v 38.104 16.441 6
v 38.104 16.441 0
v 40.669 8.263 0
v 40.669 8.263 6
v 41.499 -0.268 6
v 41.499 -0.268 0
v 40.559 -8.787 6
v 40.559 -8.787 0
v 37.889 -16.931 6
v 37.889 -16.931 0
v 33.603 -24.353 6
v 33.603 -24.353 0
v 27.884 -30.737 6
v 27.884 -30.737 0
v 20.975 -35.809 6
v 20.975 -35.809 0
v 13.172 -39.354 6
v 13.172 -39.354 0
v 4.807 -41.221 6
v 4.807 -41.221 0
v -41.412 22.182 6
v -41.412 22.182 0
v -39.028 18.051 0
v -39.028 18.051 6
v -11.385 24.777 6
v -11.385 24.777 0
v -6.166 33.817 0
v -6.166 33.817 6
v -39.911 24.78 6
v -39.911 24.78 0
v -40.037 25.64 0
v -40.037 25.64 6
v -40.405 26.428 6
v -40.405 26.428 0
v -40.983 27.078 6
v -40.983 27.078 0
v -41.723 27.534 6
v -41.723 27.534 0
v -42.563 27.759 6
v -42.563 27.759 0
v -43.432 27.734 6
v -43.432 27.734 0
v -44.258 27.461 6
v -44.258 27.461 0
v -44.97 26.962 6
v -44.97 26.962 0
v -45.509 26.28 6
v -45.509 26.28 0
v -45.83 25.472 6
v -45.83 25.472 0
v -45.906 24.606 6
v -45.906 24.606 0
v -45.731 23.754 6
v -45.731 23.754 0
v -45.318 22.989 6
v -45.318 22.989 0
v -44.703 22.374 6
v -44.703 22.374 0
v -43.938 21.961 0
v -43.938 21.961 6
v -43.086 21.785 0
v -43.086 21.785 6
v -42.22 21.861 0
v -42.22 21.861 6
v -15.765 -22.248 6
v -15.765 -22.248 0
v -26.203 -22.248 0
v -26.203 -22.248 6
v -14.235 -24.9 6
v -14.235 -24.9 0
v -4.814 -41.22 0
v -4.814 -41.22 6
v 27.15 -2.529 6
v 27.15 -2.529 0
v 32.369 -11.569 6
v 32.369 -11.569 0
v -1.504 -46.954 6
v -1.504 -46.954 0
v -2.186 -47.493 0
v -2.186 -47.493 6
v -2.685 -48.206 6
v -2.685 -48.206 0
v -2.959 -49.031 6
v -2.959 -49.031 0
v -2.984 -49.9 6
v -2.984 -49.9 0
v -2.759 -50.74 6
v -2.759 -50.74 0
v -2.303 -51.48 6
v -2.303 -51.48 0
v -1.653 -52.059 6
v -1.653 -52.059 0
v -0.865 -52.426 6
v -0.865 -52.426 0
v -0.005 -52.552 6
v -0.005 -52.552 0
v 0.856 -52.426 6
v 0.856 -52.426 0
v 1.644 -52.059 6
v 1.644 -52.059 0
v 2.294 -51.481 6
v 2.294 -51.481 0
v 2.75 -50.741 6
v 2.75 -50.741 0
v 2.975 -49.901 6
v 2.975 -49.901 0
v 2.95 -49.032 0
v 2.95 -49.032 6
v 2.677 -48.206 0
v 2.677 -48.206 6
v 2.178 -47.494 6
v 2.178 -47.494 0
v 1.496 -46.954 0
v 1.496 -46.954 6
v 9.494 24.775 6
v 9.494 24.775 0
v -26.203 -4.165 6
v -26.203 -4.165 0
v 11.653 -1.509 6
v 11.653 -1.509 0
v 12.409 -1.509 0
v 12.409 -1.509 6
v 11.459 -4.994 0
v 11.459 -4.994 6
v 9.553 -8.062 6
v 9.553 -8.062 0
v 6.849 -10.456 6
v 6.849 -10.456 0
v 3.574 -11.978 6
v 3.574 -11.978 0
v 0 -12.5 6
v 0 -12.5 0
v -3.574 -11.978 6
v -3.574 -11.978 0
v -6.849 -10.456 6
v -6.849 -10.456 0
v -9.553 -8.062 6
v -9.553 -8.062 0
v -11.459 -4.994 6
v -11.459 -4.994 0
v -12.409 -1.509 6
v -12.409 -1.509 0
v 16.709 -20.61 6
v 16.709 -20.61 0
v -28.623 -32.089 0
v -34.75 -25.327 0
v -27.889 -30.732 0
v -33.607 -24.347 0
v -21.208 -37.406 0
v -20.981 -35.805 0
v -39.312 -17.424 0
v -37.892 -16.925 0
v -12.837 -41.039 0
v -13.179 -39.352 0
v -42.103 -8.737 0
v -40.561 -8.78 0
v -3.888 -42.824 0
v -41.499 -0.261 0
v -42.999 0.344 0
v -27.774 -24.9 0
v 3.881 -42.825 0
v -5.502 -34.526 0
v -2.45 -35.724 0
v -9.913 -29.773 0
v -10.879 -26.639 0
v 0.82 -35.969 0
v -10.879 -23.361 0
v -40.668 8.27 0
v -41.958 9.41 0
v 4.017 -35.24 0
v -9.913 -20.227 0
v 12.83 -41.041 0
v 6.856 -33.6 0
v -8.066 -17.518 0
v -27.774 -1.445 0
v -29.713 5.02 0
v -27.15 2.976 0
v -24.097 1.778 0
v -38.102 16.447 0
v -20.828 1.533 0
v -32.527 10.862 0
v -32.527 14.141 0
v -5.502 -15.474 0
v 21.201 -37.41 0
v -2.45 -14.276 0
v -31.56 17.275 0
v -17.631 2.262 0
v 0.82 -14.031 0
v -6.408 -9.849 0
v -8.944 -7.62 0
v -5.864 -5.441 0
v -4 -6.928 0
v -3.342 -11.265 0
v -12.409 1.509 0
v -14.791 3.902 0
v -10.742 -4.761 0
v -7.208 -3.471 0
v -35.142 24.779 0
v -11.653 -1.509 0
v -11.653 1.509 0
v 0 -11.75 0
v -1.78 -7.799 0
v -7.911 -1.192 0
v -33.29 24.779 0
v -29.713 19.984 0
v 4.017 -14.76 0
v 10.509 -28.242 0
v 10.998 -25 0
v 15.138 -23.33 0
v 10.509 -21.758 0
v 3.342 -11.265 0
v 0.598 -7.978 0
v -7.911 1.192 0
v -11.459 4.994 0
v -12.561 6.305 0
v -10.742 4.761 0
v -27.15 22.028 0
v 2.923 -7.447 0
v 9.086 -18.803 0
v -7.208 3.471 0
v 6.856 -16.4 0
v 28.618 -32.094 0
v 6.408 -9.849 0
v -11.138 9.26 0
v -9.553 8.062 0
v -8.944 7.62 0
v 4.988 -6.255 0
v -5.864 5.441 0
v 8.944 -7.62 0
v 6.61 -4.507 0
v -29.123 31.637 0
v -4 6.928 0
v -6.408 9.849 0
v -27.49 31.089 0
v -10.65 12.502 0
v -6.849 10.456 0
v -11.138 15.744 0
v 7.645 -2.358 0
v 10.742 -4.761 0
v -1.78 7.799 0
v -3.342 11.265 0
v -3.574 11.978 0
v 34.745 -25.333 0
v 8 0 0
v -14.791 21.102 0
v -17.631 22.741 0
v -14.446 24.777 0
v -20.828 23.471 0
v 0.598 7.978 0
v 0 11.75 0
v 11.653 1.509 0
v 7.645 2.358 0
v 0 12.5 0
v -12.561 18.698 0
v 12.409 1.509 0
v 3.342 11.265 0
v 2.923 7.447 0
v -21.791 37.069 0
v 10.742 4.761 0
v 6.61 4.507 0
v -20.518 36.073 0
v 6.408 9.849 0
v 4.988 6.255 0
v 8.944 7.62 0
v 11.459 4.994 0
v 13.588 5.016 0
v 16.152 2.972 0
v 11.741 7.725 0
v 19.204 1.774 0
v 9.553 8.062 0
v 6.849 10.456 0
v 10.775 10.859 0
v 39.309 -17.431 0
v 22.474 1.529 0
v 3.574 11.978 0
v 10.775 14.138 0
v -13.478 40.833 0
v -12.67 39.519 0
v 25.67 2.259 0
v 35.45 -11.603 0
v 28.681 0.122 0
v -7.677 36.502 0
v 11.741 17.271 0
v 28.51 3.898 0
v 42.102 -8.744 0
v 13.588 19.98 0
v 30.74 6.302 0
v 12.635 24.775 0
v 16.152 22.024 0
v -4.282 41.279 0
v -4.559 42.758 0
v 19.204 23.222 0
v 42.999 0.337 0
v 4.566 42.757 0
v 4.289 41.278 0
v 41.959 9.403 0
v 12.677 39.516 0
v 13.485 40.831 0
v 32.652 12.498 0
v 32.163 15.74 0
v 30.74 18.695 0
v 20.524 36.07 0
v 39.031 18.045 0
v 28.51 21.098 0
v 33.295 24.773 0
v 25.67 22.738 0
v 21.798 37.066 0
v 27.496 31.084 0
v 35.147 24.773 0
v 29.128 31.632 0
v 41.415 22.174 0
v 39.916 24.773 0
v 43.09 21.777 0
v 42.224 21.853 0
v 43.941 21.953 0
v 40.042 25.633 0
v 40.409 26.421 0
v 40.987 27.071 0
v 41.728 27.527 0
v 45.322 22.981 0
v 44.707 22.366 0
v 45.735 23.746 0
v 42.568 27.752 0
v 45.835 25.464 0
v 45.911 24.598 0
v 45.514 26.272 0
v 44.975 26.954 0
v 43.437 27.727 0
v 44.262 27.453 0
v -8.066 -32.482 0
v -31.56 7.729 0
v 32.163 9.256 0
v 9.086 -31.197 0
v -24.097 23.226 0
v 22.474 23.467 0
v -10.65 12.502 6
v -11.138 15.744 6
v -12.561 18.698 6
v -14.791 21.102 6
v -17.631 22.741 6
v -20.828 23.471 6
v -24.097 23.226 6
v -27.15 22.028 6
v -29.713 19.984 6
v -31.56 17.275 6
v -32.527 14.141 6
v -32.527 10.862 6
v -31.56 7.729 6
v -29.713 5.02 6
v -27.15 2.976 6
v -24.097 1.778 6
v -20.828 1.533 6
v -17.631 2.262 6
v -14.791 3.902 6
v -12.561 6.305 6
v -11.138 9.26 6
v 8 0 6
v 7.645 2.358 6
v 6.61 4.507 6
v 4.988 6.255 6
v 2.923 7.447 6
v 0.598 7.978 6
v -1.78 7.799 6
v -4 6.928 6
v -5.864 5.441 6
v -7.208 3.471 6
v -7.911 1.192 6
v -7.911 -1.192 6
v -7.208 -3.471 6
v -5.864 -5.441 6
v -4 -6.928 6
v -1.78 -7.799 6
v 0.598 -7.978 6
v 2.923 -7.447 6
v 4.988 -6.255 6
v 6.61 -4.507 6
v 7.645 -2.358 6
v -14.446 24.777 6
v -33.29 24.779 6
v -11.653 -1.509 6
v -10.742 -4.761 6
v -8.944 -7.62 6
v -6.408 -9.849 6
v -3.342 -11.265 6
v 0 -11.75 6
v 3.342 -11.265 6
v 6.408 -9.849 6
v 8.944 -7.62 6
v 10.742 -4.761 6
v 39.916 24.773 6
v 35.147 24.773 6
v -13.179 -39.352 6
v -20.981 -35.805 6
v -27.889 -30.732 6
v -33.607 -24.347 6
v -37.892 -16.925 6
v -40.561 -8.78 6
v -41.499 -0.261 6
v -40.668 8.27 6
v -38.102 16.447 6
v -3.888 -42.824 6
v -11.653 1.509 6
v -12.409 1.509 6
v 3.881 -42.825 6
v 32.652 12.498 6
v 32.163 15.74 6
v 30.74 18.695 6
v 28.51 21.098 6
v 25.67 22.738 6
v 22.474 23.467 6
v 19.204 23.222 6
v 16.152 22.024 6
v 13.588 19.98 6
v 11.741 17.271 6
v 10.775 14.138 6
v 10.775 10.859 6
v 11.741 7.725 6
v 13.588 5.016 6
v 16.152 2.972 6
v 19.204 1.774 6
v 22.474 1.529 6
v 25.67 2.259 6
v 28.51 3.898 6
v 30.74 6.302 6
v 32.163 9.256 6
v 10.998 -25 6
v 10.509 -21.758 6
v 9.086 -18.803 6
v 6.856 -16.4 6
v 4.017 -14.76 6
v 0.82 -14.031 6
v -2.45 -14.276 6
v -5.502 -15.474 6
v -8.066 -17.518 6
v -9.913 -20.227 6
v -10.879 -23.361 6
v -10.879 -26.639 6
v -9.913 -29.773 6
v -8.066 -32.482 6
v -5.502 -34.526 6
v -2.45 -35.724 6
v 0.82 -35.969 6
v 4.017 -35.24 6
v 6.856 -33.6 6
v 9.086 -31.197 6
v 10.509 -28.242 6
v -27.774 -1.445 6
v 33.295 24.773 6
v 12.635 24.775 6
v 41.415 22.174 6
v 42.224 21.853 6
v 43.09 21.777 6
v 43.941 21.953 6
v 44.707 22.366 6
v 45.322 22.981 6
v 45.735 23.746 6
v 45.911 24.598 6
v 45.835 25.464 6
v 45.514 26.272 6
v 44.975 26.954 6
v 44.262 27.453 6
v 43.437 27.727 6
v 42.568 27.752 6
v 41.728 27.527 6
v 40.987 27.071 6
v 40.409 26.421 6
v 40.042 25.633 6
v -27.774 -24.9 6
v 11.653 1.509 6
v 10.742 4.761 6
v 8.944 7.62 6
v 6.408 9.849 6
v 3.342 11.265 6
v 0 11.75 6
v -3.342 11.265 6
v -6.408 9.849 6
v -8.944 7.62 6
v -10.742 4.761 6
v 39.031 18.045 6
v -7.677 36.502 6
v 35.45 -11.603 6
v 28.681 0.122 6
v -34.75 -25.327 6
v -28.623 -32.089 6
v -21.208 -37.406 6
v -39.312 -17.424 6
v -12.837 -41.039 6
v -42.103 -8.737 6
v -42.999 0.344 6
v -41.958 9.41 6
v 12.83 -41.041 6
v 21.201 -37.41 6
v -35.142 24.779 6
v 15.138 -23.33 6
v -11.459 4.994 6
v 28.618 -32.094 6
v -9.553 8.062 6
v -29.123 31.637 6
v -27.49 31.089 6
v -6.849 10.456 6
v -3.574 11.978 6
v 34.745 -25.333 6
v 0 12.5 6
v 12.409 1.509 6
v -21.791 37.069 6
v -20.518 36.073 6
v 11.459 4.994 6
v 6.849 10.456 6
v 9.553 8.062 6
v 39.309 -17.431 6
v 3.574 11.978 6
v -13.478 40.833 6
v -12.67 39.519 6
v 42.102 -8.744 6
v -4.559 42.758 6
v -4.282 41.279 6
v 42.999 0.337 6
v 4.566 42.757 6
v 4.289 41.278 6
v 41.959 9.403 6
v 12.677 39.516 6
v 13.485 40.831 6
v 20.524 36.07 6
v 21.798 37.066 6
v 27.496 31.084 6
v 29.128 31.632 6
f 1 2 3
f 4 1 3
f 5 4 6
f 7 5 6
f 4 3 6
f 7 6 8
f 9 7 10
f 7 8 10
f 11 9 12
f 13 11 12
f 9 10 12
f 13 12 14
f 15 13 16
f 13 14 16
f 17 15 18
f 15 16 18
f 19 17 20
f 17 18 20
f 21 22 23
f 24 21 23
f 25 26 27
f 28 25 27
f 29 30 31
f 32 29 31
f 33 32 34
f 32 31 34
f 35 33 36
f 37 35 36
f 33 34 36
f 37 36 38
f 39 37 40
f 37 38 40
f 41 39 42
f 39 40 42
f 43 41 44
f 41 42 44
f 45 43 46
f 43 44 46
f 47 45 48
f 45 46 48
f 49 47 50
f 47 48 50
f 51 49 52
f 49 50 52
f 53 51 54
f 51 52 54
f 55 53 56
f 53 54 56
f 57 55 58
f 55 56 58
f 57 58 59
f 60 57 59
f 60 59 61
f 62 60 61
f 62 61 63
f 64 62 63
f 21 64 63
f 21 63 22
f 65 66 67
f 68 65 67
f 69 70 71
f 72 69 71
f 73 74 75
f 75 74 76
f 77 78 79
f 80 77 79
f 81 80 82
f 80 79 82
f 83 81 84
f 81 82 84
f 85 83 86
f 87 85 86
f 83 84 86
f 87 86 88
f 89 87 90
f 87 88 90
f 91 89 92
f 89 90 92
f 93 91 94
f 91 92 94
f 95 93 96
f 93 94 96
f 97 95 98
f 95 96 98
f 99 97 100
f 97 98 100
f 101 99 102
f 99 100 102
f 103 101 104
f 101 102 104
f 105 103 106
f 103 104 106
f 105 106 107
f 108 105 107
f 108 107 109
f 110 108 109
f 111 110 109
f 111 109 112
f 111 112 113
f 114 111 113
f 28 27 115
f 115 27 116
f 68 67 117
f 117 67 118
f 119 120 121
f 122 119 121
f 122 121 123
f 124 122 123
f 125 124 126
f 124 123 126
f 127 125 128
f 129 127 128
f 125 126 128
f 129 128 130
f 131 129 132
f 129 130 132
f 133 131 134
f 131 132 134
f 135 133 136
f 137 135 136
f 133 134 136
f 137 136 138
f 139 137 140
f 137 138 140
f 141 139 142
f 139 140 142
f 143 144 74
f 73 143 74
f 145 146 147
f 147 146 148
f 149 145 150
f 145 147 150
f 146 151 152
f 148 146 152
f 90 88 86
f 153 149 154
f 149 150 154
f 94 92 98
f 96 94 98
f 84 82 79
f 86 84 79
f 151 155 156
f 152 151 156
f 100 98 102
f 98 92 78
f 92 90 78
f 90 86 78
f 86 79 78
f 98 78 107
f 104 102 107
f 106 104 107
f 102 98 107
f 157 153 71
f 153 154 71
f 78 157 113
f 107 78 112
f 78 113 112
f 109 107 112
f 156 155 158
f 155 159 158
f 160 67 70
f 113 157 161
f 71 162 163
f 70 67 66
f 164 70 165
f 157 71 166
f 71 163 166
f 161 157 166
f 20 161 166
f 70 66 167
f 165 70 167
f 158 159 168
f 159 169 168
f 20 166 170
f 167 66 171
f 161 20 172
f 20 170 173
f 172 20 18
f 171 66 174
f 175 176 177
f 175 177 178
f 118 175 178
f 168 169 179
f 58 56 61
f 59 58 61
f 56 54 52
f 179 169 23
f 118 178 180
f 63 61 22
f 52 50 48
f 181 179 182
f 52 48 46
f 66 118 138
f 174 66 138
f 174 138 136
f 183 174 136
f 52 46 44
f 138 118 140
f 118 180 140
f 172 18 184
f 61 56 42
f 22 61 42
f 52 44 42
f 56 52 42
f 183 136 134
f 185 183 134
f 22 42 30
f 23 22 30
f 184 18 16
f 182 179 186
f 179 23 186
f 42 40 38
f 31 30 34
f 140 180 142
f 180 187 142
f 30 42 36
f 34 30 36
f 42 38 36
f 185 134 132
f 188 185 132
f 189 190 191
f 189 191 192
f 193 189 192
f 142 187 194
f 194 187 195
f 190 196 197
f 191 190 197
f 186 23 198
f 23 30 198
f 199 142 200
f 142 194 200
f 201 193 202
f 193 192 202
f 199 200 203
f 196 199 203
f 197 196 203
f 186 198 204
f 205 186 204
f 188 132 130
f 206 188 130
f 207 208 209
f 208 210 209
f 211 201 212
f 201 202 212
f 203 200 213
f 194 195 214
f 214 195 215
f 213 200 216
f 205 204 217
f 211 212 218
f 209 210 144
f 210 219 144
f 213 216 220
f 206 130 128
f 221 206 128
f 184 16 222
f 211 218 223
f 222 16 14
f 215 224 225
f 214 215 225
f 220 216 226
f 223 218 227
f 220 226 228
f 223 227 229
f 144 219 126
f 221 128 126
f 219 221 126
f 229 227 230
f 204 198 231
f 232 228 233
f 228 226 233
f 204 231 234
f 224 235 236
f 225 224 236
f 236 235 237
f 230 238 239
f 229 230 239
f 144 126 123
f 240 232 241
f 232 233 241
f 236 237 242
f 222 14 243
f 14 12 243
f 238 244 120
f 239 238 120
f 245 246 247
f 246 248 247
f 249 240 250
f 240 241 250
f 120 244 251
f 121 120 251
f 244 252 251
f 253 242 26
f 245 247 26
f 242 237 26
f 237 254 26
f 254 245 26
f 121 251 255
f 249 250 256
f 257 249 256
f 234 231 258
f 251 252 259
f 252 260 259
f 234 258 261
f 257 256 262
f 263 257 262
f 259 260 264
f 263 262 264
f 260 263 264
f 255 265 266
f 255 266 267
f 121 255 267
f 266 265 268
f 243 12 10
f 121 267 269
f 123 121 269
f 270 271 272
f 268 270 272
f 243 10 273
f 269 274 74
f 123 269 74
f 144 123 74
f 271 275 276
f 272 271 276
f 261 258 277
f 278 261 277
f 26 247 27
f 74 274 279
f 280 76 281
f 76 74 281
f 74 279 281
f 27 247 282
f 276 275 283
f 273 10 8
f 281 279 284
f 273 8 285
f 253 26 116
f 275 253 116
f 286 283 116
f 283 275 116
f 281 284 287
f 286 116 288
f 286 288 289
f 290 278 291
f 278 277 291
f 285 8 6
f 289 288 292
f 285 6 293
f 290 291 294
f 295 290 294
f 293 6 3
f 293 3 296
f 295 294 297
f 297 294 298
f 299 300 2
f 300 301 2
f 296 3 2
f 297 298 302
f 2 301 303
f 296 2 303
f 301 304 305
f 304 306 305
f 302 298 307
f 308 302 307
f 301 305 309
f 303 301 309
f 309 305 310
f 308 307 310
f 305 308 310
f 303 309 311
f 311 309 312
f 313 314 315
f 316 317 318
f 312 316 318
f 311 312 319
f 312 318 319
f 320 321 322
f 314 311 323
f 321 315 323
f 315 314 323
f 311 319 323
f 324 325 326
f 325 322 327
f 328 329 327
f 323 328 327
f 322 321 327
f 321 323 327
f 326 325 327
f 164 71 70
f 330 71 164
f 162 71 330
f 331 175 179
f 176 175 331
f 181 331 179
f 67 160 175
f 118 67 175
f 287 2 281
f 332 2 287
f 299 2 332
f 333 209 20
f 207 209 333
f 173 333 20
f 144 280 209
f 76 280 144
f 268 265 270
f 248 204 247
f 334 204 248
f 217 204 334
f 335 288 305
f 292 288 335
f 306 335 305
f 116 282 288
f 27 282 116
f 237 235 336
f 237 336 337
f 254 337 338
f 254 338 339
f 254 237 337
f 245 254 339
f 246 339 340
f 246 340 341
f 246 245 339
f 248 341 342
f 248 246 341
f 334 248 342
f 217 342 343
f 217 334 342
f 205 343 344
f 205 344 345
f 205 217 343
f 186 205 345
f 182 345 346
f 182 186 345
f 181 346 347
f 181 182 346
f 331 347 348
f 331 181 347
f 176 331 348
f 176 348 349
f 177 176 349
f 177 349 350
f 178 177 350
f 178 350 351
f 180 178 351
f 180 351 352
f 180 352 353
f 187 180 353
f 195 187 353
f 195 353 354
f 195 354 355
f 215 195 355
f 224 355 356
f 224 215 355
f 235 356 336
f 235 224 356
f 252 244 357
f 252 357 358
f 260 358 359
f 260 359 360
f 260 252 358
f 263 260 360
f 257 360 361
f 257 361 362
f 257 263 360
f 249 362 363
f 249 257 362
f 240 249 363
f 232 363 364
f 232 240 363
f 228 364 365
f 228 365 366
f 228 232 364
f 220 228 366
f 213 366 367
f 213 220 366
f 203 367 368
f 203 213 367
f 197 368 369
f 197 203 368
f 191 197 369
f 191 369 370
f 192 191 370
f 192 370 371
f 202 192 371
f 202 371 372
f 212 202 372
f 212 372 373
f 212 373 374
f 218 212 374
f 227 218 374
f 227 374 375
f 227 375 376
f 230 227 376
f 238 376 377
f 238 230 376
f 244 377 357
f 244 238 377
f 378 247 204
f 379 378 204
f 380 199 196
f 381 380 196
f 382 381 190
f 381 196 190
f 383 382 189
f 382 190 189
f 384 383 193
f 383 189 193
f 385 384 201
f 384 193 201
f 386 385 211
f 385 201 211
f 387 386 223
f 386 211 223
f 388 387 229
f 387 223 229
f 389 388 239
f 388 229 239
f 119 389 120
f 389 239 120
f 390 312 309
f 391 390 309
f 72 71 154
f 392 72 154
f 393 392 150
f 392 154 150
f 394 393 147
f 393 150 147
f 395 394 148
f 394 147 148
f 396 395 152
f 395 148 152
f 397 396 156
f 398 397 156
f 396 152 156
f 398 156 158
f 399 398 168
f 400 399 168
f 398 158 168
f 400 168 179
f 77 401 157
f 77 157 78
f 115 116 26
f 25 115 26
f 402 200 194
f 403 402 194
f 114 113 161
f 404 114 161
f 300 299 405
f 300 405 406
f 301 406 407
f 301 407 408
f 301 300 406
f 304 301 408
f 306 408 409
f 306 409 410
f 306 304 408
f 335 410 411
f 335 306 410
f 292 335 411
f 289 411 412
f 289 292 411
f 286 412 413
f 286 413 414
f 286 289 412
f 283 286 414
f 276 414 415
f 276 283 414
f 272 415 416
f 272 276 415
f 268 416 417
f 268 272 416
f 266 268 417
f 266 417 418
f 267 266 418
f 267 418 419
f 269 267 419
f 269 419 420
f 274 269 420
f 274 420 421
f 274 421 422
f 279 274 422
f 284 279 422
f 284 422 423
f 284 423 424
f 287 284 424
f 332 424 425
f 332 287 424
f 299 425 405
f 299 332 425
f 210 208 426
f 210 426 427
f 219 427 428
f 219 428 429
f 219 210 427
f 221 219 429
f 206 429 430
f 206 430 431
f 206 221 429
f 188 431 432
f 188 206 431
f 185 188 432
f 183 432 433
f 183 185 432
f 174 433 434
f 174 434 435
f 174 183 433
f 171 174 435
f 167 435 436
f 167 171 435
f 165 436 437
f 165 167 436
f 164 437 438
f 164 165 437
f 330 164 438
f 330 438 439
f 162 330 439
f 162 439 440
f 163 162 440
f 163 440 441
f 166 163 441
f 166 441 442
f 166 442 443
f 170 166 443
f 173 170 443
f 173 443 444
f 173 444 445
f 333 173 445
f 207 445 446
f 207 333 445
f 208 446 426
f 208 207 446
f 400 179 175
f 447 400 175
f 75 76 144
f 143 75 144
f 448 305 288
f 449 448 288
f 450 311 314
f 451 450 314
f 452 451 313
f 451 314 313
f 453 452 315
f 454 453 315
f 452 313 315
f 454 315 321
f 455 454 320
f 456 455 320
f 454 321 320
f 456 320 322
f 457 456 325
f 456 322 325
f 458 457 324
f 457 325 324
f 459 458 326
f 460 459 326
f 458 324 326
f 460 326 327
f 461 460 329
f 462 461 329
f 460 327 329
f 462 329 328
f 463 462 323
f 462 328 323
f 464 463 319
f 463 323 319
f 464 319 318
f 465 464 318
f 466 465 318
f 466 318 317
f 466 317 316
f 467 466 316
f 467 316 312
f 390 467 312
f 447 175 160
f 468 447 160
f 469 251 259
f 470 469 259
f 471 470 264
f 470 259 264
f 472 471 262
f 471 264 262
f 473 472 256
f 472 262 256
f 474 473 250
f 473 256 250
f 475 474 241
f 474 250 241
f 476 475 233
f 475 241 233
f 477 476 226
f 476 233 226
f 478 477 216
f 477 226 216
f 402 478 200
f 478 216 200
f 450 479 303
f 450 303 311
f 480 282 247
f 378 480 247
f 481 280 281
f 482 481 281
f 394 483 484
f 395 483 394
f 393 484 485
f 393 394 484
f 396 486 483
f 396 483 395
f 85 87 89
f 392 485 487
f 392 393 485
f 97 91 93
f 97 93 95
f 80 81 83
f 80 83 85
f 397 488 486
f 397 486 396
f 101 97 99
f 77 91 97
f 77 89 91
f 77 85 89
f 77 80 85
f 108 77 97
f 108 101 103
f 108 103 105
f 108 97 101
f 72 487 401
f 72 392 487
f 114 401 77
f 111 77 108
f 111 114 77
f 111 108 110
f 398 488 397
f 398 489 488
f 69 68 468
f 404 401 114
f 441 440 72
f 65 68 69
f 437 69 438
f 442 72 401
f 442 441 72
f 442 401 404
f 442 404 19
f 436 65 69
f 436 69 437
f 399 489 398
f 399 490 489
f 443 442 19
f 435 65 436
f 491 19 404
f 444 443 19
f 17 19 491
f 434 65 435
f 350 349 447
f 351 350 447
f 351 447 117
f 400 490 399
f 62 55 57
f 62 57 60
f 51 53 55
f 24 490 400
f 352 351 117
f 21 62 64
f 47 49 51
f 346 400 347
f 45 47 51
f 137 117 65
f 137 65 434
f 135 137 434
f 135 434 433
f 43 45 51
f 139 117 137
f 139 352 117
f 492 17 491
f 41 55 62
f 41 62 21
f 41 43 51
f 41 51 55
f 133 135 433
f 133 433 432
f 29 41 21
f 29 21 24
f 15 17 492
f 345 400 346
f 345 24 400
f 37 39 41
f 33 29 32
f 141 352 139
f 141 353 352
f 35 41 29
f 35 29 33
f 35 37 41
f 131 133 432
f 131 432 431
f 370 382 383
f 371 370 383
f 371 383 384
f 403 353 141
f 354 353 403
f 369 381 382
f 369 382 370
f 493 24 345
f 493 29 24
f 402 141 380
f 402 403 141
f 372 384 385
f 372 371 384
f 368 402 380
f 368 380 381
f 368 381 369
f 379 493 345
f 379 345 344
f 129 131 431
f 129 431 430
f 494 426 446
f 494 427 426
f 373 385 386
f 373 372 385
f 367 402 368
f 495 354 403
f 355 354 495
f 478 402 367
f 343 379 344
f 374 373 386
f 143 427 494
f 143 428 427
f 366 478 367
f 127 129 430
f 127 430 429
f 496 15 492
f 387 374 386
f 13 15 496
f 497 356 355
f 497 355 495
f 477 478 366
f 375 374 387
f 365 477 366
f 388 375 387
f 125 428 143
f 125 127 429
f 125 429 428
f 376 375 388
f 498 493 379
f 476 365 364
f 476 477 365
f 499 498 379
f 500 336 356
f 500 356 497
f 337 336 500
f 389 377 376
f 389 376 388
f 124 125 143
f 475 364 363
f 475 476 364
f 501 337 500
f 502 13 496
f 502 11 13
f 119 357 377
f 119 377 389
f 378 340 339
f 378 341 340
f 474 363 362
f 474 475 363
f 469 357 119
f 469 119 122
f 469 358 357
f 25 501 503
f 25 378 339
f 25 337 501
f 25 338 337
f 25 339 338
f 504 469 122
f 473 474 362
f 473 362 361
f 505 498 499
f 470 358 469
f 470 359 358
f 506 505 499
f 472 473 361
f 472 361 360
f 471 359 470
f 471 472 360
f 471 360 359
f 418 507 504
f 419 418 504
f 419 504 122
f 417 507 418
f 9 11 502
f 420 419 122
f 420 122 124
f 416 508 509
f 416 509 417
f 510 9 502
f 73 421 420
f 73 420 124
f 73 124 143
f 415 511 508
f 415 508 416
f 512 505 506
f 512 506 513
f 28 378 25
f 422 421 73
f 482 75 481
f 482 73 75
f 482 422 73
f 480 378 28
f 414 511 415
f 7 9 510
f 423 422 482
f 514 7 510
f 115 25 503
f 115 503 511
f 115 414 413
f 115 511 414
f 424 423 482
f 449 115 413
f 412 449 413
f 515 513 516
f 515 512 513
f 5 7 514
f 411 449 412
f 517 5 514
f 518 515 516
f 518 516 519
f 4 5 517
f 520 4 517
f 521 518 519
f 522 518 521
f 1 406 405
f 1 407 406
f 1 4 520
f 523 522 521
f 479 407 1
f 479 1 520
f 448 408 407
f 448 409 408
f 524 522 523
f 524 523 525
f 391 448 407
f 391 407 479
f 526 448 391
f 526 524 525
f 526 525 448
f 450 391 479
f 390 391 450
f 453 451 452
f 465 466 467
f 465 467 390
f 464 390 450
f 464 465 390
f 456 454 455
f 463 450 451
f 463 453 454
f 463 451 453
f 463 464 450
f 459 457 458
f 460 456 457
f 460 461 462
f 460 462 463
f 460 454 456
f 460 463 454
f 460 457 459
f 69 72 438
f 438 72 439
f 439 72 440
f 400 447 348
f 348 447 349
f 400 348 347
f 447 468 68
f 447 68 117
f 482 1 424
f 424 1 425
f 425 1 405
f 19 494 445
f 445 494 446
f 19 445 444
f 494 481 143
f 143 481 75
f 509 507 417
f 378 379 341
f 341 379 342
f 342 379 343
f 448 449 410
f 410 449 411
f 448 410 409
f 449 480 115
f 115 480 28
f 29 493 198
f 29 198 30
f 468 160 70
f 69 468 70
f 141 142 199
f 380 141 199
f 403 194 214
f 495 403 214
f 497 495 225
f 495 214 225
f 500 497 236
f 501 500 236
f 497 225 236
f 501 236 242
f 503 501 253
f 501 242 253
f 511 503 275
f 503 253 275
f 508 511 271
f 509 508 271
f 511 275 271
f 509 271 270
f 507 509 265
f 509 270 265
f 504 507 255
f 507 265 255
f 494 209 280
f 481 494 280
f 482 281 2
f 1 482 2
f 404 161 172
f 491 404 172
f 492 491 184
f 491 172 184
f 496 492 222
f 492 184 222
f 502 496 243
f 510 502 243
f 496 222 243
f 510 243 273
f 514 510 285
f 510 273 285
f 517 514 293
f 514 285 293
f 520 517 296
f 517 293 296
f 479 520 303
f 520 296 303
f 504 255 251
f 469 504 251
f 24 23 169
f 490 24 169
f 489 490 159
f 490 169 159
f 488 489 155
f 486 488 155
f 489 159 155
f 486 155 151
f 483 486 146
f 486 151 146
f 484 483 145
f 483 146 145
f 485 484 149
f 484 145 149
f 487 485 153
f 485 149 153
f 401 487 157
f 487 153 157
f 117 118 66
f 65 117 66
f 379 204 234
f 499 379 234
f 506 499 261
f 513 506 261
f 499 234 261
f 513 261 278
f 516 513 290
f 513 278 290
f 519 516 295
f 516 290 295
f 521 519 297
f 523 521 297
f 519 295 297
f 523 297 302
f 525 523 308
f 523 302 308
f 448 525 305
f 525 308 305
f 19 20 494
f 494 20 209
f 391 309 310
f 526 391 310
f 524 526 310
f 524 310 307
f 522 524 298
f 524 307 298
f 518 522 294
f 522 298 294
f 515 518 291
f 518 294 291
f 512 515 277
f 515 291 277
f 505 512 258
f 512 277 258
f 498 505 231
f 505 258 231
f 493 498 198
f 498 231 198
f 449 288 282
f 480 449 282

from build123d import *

# Parameters (mm, degrees)
F0_R     = 11
F0_R_2   = 8
F1_DEPTH = 6


with BuildPart() as f1:
    # F0 (on Top) → F1 (new body)
    with BuildSketch(Plane.XY):
        with BuildLine():
            Line((39.030607, 18.044715), (41.415403, 22.174484))
            ThreePointArc((41.415403, 22.174484), (45.513832, 26.272208), (39.915627, 24.772689))
            Line((39.915627, 24.772689), (35.146743, 24.773099))
            ThreePointArc((35.146743, 24.773099), (0.003695, 43), (-35.142485, 24.779139))
            Line((-35.142485, 24.779139), (-39.911368, 24.779549))
            ThreePointArc((-39.911368, 24.779549), (-45.509316, 26.28003), (-41.411592, 22.181602))
            Line((-41.411592, 22.181602), (-39.027505, 18.051423))
            ThreePointArc((-39.027505, 18.051423), (-37.24094, -21.4968), (-3.888122, -42.823854))
            Line((-3.888122, -42.823854), (-1.504035, -46.954034))
            ThreePointArc((-1.504035, -46.954034), (-0.004516, -52.552239), (1.495965, -46.954291))
            Line((1.495965, -46.954291), (3.880762, -42.824522))
            ThreePointArc((3.880762, -42.824522), (37.237245, -21.5032), (39.030607, 18.044715))
        make_face()
        with BuildLine():
            Line((-14.234654, -24.899577), (-4.814016, -41.219841))
            ThreePointArc((-4.814016, -41.219841), (-35.941837, -20.746911), (-38.101611, 16.447409))
            Line((-38.101611, 16.447409), (-27.773521, -1.444918))
            Line((-27.773521, -1.444918), (-27.773521, -24.899577))
            Line((-27.773521, -24.899577), (-14.234654, -24.899577))
        make_face(mode=Mode.SUBTRACT)
        with Locations((-0.002148, -25)):
            Circle(F0_R, mode=Mode.SUBTRACT)
        Polygon((-15.765198, -22.248072), (-26.203172, -22.248072), (-26.203172, -4.165382), align=None, mode=Mode.SUBTRACT)
        with BuildLine():
            ThreePointArc((-11.652676, -1.509186), (0, -11.75), (11.652676, -1.509186))
            Line((11.652676, -1.509186), (12.40856, -1.509186))
            ThreePointArc((12.40856, -1.509186), (0, -12.5), (-12.40856, -1.509186))
            Line((-12.40856, -1.509186), (-11.652676, -1.509186))
        make_face(mode=Mode.SUBTRACT)
        with BuildLine():
            ThreePointArc((38.104437, 16.44086), (35.938271, -20.753088), (4.806931, -41.220667))
            Line((4.806931, -41.220667), (15.138096, -23.330116))
            Line((15.138096, -23.330116), (35.450427, -11.602786))
            Line((35.450427, -11.602786), (28.680994, 0.122216))
            Line((28.680994, 0.122216), (38.104437, 16.44086))
        make_face(mode=Mode.SUBTRACT)
        Polygon((27.149994, -2.529026), (32.368981, -11.568576), (16.708913, -20.609921), align=None, mode=Mode.SUBTRACT)
        Circle(F0_R_2, mode=Mode.SUBTRACT)
        with BuildLine():
            Line((12.40856, 1.509186), (11.652676, 1.509186))
            ThreePointArc((11.652676, 1.509186), (0, 11.75), (-11.652676, 1.509186))
            Line((-11.652676, 1.509186), (-12.40856, 1.509186))
            ThreePointArc((-12.40856, 1.509186), (0, 12.5), (12.40856, 1.509186))
        make_face(mode=Mode.SUBTRACT)
        with Locations((-21.649561, 12.50186)):
            Circle(F0_R, mode=Mode.SUBTRACT)
        Polygon((-11.384796, 24.777098), (-6.16581, 33.816648), (9.494259, 24.775304), align=None, mode=Mode.SUBTRACT)
        with BuildLine():
            ThreePointArc((-33.290421, 24.77898), (0.003566, 41.5), (33.294679, 24.773258))
            Line((33.294679, 24.773258), (12.635425, 24.775034))
            Line((12.635425, 24.775034), (-7.676906, 36.502363))
            Line((-7.676906, 36.502363), (-14.446339, 24.777361))
            Line((-14.446339, 24.777361), (-33.290421, 24.77898))
        make_face(mode=Mode.SUBTRACT)
        with Locations((21.651709, 12.498139)):
            Circle(F0_R, mode=Mode.SUBTRACT)
    extrude(amount=F1_DEPTH)


solid = f1.part
